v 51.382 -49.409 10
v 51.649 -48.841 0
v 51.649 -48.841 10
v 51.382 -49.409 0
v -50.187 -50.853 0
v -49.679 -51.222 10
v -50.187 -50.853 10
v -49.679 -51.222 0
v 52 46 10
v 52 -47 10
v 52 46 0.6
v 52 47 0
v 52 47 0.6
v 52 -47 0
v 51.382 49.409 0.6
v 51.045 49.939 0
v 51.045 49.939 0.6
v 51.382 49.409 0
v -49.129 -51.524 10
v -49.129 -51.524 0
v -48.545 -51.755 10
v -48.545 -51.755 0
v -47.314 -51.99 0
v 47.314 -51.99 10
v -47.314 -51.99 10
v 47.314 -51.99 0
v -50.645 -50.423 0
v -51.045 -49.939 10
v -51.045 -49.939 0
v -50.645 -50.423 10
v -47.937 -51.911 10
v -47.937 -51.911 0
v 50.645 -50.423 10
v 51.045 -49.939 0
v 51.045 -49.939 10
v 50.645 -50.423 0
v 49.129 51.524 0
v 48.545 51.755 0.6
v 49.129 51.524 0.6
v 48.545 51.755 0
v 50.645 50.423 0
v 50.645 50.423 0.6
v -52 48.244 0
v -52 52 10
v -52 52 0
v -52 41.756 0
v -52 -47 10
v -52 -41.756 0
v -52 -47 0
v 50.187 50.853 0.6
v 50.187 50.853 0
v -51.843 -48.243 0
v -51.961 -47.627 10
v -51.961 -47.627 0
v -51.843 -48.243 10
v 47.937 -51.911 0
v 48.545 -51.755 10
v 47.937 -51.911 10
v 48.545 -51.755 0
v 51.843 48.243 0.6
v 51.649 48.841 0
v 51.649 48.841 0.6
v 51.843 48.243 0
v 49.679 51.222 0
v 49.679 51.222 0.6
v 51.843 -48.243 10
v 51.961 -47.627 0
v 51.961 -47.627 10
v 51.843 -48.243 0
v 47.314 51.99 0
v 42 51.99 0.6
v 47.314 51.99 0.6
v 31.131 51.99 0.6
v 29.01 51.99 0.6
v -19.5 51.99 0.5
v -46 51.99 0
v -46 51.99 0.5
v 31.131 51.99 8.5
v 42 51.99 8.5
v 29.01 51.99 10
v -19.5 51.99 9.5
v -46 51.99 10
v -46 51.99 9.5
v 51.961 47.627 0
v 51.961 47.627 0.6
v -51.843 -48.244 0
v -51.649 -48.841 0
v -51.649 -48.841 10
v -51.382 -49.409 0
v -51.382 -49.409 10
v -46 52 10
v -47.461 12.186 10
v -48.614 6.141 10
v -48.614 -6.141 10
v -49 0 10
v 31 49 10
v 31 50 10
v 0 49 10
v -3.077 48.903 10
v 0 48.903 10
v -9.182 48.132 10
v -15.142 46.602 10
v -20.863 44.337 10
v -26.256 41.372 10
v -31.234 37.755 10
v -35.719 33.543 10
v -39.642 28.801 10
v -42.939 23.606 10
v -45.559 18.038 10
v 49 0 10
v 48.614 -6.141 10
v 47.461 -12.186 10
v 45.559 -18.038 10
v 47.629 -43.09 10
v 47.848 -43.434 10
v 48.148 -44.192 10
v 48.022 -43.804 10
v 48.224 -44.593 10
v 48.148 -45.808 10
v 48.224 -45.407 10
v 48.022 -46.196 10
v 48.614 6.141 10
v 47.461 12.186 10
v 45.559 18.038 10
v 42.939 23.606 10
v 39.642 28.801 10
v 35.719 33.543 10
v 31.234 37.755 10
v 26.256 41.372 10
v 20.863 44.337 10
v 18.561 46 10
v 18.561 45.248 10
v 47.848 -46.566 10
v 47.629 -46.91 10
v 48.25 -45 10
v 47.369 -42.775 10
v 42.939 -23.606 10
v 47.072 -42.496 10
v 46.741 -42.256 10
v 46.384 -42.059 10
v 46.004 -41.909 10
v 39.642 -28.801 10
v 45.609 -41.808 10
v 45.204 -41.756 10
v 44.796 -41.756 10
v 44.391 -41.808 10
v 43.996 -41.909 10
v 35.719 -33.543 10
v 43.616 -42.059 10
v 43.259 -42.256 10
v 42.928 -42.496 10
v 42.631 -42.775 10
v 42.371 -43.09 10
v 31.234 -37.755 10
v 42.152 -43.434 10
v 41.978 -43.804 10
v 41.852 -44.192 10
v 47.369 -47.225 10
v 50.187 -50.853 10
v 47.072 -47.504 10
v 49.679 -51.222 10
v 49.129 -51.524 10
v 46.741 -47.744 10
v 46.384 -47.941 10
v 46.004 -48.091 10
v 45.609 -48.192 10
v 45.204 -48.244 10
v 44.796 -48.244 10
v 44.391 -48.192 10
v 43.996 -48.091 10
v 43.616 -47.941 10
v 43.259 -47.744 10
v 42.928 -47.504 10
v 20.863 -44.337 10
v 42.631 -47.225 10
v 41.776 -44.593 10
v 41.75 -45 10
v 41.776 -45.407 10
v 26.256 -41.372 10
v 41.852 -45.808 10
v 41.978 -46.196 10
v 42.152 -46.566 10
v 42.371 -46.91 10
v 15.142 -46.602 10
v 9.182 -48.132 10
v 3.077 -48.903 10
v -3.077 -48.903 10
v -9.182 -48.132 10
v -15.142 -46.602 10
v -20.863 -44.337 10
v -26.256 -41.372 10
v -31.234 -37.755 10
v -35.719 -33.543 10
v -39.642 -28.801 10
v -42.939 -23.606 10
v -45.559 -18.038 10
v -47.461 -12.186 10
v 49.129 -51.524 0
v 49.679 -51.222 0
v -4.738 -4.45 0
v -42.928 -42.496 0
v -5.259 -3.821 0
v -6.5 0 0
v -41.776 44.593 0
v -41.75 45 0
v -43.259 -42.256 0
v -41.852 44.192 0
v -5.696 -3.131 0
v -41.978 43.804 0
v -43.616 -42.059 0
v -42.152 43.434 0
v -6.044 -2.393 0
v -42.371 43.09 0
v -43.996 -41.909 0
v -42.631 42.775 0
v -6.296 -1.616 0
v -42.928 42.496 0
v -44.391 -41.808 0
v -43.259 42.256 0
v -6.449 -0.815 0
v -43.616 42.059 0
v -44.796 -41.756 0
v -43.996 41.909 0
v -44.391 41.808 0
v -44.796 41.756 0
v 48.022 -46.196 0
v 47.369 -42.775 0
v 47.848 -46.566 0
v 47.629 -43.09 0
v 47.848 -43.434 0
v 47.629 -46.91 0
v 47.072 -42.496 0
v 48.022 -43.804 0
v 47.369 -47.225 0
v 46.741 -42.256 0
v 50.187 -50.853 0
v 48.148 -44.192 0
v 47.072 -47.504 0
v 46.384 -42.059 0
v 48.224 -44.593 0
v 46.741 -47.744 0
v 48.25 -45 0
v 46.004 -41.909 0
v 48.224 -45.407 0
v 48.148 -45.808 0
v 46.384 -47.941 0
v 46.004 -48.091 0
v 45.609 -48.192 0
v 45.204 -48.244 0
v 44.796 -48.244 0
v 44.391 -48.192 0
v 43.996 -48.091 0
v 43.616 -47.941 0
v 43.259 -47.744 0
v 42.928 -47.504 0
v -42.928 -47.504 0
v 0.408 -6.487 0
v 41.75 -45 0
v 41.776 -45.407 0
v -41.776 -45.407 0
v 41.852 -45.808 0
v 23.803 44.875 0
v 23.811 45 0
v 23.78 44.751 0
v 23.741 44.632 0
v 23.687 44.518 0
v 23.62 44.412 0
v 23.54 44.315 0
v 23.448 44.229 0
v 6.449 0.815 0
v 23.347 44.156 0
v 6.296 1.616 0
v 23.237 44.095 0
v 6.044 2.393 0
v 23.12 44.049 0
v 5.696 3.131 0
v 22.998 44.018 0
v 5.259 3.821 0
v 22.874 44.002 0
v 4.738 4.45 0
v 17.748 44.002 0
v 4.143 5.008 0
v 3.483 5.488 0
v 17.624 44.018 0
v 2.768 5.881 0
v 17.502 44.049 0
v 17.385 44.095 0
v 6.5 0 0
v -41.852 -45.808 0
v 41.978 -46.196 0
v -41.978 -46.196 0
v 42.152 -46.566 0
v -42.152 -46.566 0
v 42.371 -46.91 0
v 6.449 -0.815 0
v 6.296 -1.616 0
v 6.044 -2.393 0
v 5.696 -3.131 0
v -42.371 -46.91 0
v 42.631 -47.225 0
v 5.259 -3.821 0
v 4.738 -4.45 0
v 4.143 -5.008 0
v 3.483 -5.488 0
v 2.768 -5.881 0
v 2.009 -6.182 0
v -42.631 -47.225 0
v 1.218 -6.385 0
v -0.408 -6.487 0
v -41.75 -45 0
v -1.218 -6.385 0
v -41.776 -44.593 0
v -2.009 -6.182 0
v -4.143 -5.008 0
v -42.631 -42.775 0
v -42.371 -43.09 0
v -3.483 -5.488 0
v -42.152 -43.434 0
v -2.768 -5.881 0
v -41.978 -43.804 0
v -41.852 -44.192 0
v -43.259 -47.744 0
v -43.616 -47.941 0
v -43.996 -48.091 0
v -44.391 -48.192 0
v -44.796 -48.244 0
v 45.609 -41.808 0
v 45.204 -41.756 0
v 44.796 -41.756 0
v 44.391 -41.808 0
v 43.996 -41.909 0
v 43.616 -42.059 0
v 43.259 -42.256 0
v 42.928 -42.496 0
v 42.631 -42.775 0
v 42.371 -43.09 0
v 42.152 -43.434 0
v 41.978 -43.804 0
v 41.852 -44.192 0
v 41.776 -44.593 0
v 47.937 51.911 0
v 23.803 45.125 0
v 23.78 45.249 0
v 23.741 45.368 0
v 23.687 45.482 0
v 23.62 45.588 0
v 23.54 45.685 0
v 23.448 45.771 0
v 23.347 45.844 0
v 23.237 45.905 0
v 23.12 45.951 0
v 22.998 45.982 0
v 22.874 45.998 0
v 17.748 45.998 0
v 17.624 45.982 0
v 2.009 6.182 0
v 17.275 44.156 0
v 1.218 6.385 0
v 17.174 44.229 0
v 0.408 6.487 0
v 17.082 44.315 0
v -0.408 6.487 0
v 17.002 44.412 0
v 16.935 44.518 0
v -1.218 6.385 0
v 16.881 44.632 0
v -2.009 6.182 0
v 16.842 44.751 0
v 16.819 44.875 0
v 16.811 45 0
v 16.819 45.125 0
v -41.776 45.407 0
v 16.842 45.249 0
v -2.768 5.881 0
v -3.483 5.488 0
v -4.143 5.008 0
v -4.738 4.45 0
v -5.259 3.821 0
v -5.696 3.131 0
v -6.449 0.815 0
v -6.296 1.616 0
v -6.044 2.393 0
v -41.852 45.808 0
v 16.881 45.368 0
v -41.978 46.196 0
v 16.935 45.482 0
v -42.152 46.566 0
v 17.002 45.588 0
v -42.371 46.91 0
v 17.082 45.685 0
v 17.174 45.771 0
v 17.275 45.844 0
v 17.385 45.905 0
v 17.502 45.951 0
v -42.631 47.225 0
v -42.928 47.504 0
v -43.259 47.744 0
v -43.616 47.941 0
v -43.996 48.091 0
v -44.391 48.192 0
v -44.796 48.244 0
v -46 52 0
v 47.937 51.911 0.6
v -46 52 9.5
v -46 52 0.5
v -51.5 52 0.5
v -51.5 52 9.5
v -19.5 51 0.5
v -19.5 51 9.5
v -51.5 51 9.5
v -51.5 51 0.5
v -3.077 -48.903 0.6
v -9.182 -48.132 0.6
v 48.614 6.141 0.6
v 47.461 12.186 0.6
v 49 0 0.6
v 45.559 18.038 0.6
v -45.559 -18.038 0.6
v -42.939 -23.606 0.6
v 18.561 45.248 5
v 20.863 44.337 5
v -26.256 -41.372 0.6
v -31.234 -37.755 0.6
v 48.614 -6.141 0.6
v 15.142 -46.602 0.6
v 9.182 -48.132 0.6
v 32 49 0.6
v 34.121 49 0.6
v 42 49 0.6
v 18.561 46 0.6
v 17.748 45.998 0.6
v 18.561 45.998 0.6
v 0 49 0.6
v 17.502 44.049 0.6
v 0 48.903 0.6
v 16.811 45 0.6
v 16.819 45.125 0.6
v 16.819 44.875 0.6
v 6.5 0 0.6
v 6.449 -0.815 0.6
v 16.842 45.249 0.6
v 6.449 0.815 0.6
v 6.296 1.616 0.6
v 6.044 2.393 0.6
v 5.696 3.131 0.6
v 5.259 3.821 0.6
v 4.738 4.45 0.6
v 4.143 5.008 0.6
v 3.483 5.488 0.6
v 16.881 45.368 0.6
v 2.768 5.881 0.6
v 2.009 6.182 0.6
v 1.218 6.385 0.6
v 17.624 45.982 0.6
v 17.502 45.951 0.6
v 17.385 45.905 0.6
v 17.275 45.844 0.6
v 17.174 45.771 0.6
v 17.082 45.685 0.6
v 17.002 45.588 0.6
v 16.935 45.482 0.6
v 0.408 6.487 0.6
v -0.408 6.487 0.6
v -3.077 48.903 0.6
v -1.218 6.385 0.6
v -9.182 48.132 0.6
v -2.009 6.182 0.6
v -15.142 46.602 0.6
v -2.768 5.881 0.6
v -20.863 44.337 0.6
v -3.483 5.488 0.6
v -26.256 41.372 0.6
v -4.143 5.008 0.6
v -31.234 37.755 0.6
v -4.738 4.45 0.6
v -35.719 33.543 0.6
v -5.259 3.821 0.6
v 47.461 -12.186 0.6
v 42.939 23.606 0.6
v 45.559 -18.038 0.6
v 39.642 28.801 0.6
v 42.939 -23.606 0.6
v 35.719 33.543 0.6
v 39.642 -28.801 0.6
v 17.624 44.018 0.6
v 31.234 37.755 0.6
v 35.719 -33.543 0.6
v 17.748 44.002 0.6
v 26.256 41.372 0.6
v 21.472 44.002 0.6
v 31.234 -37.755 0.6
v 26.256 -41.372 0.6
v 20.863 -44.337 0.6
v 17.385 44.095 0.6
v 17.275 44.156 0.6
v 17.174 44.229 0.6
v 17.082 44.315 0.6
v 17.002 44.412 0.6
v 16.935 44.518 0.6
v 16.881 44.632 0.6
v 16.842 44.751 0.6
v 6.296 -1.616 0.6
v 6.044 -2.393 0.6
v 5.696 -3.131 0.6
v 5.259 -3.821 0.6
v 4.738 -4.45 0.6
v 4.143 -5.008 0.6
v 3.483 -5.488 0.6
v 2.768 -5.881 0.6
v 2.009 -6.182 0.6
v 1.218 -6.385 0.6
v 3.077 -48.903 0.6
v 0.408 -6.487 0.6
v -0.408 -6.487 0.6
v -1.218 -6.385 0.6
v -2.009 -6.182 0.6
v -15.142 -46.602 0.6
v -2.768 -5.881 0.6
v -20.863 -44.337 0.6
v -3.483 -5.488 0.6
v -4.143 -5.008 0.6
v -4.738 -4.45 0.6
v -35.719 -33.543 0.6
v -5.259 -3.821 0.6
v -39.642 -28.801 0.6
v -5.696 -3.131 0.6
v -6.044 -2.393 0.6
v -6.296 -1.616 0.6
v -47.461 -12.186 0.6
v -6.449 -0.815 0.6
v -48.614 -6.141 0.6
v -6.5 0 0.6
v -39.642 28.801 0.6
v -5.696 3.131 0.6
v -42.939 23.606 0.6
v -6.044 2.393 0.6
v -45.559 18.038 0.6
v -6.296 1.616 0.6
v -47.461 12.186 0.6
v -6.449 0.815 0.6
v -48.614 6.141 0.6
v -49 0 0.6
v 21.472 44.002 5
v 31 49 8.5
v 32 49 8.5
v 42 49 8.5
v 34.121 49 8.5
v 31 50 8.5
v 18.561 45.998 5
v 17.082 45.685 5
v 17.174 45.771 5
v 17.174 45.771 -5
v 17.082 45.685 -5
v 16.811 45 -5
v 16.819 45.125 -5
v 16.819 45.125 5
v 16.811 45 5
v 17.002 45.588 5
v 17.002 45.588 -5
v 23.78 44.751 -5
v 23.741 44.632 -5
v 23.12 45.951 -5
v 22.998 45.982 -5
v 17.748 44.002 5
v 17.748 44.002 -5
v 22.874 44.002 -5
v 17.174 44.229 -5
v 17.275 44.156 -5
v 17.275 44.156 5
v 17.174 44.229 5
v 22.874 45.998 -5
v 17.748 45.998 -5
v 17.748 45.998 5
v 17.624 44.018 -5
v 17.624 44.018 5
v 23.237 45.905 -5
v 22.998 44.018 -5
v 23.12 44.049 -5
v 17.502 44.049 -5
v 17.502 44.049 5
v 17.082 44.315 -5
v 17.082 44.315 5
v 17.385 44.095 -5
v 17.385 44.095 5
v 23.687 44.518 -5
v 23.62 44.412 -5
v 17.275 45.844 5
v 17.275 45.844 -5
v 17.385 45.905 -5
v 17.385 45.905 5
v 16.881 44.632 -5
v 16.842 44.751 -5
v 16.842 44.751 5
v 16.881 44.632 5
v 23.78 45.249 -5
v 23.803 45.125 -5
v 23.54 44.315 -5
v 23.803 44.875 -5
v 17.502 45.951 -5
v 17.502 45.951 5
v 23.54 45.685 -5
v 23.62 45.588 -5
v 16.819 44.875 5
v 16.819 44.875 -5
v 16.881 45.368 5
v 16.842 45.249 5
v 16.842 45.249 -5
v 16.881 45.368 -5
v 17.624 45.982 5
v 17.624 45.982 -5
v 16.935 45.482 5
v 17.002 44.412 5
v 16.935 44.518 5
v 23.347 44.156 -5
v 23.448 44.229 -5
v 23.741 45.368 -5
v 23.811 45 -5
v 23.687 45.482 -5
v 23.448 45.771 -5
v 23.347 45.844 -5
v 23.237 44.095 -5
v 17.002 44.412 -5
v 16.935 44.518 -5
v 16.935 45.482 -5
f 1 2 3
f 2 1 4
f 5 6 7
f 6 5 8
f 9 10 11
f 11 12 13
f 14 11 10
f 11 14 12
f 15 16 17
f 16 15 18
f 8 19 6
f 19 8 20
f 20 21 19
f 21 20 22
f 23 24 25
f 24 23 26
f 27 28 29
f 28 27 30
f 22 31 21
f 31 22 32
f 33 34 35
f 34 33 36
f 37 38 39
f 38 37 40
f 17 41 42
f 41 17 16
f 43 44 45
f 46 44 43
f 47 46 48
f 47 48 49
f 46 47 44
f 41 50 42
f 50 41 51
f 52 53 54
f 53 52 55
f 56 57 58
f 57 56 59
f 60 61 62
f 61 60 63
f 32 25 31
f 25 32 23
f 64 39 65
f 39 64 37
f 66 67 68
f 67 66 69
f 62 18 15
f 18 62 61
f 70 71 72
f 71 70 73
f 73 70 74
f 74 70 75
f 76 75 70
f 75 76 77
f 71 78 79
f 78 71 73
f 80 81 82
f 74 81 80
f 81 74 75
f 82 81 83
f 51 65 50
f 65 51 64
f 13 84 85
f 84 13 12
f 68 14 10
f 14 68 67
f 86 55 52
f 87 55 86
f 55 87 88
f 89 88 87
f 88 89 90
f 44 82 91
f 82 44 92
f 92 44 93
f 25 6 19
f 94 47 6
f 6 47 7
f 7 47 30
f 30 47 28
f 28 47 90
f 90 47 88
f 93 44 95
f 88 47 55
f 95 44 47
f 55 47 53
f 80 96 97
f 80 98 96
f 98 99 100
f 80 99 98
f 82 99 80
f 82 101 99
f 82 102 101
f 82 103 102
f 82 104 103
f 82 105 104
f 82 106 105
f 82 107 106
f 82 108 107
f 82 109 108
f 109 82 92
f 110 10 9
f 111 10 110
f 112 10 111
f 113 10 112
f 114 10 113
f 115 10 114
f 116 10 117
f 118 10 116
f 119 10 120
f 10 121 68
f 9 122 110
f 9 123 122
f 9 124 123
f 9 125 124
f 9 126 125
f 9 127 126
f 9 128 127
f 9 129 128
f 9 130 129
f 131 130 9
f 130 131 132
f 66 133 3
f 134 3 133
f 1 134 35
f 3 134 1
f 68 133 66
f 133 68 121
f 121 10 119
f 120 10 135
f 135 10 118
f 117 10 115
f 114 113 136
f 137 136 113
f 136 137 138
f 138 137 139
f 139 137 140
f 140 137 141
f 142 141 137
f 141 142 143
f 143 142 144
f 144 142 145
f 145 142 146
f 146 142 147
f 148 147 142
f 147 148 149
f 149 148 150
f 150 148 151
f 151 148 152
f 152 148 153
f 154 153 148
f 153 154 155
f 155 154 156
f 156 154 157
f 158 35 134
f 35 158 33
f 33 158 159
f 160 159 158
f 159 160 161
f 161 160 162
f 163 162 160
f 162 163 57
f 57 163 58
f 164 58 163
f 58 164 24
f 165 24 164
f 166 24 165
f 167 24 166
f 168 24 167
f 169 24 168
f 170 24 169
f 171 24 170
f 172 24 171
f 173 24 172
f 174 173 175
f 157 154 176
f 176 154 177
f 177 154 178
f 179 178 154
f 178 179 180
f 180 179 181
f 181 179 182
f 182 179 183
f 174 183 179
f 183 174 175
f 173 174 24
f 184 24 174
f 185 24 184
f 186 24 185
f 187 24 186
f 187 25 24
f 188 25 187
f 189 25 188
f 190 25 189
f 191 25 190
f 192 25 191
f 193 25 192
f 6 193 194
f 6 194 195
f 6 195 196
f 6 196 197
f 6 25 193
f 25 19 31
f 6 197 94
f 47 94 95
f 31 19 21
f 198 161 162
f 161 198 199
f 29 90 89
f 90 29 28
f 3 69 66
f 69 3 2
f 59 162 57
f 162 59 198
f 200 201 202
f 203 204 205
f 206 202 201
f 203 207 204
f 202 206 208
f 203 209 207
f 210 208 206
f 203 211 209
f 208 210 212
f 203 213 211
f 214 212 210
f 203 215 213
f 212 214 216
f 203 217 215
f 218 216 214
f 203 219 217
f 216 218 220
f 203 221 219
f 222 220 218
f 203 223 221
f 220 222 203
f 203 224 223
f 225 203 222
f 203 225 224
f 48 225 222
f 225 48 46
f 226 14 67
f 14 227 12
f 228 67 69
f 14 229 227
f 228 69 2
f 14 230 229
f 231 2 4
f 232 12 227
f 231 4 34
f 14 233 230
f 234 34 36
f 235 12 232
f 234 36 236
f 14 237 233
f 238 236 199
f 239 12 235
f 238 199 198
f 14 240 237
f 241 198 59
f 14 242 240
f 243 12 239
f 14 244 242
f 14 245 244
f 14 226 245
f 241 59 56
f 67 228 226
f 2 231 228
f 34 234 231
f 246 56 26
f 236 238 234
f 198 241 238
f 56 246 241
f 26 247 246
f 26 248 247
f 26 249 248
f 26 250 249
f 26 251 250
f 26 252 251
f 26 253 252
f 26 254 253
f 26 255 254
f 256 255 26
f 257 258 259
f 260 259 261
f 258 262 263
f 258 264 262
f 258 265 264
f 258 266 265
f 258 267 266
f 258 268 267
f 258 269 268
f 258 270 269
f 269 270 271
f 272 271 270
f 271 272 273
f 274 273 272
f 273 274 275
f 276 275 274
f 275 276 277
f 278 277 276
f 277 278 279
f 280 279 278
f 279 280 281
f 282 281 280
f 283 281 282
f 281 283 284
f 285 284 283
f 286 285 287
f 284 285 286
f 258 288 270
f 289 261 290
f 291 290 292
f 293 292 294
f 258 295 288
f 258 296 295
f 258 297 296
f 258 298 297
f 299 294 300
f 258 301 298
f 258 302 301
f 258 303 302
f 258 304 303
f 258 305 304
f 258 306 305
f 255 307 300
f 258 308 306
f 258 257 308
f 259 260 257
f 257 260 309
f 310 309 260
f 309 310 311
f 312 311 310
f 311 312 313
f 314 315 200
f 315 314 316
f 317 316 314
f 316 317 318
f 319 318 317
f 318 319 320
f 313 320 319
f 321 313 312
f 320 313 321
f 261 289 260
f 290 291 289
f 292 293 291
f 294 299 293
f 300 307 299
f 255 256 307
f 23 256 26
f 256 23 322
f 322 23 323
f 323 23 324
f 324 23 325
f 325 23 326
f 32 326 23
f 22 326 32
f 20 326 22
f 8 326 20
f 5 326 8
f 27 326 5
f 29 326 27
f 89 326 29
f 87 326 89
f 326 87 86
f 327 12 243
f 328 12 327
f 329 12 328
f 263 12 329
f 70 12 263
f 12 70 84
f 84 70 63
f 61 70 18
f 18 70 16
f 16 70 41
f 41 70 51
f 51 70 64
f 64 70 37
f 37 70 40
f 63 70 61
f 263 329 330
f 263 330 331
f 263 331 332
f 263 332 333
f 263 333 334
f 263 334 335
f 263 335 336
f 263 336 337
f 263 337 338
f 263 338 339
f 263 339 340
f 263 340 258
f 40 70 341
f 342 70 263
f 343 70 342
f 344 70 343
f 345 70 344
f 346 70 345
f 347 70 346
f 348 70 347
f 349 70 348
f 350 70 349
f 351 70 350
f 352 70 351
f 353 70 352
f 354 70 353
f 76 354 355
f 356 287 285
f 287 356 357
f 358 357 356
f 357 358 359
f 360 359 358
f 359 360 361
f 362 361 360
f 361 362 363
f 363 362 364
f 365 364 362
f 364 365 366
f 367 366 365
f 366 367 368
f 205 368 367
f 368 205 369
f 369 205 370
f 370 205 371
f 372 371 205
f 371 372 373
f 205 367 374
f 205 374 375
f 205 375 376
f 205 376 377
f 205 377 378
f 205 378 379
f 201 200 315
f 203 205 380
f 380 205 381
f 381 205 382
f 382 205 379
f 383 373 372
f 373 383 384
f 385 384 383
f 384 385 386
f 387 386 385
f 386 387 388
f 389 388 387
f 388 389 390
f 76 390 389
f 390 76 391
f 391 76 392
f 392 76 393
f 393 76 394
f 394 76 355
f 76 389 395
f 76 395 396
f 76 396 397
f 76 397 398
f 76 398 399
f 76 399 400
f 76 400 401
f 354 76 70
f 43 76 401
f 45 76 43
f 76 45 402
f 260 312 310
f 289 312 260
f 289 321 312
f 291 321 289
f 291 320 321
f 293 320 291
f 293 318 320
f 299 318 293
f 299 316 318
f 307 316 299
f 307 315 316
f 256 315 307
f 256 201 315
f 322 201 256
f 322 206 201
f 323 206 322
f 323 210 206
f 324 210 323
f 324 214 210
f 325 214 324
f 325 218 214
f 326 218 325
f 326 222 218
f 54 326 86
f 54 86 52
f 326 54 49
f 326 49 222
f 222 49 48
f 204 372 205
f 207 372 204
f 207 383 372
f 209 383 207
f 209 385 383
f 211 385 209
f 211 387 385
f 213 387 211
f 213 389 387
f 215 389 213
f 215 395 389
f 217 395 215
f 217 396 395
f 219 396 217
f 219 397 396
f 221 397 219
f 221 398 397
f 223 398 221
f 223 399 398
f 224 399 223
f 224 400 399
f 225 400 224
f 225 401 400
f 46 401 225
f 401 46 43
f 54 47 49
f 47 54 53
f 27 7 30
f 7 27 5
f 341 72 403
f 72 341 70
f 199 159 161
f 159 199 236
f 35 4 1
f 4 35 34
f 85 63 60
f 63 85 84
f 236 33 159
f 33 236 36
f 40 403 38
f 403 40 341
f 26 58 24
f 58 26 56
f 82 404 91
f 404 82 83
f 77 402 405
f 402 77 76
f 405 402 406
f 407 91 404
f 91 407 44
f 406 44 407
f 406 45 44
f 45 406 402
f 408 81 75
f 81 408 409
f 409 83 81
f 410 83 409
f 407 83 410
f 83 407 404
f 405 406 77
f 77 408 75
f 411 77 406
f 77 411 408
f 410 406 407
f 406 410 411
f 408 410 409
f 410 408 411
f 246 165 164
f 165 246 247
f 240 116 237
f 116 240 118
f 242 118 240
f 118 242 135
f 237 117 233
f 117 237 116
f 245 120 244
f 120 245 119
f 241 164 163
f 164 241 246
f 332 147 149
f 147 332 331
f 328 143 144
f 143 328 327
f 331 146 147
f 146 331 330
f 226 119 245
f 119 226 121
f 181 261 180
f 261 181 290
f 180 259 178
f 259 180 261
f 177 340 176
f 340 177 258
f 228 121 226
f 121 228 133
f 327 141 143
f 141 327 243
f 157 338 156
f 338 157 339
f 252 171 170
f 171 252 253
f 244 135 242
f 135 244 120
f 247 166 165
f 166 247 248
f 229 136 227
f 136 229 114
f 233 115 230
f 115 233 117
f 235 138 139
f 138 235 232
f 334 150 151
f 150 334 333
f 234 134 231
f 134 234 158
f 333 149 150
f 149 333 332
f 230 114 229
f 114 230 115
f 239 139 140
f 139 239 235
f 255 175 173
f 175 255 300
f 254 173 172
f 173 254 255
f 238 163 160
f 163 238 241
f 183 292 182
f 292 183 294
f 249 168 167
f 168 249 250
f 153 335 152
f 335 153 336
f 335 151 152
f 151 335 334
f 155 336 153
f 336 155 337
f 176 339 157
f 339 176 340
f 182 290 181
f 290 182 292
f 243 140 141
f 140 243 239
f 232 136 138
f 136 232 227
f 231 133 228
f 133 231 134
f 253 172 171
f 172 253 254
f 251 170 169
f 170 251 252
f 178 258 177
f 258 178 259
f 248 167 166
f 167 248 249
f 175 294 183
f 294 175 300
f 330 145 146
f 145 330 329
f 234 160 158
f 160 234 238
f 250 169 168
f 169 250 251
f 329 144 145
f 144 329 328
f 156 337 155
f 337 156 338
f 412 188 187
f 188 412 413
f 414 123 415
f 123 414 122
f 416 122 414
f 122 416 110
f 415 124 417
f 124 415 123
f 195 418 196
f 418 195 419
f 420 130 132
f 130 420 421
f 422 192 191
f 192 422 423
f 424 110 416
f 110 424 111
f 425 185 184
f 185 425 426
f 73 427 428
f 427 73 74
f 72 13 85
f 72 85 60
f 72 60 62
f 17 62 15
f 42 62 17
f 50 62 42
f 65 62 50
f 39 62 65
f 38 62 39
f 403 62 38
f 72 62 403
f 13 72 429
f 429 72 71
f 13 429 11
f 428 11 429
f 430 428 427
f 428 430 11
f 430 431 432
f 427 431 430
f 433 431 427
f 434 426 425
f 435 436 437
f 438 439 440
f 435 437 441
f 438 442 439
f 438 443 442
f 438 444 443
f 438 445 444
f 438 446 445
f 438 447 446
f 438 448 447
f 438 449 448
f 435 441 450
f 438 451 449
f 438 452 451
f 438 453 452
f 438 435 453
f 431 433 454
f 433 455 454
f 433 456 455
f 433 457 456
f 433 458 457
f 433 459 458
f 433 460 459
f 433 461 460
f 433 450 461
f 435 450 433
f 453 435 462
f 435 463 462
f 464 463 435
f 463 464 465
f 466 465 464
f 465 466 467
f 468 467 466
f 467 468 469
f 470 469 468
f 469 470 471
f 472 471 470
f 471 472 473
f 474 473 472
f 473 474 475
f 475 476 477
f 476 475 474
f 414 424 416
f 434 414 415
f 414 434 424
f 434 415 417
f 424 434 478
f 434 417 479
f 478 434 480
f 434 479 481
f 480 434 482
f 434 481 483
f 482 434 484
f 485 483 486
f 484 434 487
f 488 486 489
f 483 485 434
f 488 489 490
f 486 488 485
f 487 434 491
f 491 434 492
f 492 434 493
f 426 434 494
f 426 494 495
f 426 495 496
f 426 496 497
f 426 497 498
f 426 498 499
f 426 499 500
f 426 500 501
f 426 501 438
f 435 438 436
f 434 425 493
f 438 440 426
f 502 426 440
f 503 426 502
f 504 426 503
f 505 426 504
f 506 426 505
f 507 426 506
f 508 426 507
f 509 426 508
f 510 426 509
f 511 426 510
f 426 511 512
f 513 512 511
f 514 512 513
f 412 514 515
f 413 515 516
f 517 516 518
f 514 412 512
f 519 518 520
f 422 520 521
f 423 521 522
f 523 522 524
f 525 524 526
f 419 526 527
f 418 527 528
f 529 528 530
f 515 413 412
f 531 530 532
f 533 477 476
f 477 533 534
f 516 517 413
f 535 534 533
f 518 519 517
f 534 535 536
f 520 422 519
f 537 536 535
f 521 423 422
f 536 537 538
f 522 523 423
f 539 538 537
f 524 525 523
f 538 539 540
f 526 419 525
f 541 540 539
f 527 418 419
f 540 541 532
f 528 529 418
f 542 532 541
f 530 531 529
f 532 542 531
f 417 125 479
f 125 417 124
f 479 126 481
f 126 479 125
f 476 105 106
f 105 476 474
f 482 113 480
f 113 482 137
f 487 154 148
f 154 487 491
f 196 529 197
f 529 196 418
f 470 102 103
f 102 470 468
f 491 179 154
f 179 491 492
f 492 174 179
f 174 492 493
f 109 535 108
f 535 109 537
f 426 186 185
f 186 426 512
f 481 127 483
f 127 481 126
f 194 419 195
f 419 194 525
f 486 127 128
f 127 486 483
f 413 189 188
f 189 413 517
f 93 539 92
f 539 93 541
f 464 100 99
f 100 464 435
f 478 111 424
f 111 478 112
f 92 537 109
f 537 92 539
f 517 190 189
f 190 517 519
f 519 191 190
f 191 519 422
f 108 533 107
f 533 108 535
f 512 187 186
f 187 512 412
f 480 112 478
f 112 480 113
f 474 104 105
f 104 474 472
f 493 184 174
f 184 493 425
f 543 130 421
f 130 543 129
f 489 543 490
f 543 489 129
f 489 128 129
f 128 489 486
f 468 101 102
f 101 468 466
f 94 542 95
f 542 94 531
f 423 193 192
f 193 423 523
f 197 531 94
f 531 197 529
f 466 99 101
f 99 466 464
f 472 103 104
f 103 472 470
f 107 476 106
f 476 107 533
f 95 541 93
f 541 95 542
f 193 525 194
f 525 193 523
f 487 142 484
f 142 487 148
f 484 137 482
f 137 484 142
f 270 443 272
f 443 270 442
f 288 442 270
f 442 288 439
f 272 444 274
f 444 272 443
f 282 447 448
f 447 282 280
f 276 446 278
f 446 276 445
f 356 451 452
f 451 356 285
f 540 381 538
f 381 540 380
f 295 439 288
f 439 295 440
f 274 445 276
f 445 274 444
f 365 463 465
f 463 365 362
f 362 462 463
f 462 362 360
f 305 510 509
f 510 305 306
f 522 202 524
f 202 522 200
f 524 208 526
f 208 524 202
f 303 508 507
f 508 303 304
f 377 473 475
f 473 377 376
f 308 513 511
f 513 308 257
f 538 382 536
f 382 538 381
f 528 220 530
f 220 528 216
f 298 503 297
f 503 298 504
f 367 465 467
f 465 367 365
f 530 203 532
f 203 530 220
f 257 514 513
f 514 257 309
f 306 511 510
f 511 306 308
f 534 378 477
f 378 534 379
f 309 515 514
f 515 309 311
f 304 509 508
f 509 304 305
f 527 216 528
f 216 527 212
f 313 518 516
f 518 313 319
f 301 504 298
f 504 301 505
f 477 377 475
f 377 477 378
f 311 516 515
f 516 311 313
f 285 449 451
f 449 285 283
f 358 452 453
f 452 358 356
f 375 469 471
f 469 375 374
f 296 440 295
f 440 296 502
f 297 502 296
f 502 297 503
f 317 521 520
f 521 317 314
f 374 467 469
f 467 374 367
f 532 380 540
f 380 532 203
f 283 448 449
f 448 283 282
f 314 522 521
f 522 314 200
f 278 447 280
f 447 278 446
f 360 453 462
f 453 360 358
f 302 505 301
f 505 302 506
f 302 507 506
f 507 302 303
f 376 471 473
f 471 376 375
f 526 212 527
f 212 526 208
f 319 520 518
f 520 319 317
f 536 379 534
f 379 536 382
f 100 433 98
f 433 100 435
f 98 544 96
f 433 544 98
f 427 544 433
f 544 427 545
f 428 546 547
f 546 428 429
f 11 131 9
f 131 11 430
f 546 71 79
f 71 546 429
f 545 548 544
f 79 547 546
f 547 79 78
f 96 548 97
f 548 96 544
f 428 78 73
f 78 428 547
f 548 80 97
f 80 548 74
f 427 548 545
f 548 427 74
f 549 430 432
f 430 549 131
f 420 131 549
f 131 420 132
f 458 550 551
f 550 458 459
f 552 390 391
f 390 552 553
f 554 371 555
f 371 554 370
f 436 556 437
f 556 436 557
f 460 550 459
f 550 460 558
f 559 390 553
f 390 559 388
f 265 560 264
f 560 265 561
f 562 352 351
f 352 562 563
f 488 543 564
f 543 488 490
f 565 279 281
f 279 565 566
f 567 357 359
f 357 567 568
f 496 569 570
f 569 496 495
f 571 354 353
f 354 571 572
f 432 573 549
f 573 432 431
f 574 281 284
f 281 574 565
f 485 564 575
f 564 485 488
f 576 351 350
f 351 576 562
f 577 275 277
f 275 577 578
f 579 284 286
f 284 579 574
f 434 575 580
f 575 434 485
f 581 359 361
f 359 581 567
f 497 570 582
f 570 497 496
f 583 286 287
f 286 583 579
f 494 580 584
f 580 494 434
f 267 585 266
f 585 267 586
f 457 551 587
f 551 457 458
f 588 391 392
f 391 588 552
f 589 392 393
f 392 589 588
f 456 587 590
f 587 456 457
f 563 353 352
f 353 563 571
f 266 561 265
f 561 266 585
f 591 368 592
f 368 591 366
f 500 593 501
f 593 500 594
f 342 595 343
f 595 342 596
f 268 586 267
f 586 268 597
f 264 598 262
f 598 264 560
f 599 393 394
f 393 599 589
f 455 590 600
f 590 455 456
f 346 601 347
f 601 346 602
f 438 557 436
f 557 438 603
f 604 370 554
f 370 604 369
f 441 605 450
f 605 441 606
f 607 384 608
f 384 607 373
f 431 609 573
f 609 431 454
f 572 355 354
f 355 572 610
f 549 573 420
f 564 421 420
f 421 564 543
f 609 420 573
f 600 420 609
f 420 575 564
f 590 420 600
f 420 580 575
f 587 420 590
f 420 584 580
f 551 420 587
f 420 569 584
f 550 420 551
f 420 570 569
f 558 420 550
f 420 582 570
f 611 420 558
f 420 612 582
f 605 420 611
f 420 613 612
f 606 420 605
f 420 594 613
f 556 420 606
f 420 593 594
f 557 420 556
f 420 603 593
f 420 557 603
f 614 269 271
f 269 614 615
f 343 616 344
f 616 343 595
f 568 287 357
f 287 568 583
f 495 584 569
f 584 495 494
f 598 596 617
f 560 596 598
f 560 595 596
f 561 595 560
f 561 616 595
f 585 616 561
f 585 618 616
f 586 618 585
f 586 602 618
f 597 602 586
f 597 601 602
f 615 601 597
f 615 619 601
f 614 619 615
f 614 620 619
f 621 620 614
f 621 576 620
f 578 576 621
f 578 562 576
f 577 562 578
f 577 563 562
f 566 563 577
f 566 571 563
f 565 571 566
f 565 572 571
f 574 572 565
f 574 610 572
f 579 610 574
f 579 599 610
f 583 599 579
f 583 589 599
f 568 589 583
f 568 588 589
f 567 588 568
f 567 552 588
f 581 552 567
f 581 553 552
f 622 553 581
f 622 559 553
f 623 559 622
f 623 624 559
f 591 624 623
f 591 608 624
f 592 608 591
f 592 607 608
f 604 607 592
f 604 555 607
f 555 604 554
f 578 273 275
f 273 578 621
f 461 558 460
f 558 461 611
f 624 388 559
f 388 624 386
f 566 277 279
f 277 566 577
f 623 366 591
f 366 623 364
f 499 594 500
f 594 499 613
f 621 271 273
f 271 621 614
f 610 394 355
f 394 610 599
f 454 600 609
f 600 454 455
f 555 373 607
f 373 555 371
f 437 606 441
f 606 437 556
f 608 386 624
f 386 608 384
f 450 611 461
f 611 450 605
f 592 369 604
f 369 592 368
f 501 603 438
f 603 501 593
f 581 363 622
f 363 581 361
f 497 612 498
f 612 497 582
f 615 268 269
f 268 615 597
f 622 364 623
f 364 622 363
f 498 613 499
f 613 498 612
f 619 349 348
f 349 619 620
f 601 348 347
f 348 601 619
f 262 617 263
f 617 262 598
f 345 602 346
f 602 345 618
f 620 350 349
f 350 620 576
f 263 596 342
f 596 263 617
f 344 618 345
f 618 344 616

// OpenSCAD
$fn = 50;


union() {
	difference() {
		union() {
			hull() {
				translate(v = [-47.0000000000, 47.0000000000, 0]) {
					cylinder(h = 10, r = 5);
				}
				translate(v = [47.0000000000, 47.0000000000, 0]) {
					cylinder(h = 10, r = 5);
				}
				translate(v = [-47.0000000000, -47.0000000000, 0]) {
					cylinder(h = 10, r = 5);
				}
				translate(v = [47.0000000000, -47.0000000000, 0]) {
					cylinder(h = 10, r = 5);
				}
			}
			translate(v = [-52.0000000000, 46.0000000000, 0]) {
				cube(size = [6, 6, 10]);
			}
		}
		union() {
			translate(v = [-52.5000000000, -45.0000000000, -250.0000000000]) {
				rotate(a = [0, 0, 0]) {
					difference() {
						union() {
							hull() {
								translate(v = [7.5000000000, 0, 0]) {
									cylinder(h = 250, r = 3.2500000000, r1 = 3.2500000000, r2 = 3.2500000000);
								}
								translate(v = [-7.5000000000, 0, 0]) {
									cylinder(h = 250, r = 3.2500000000, r1 = 3.2500000000, r2 = 3.2500000000);
								}
							}
						}
						union();
					}
				}
			}
			translate(v = [-52.5000000000, 45.0000000000, -250.0000000000]) {
				rotate(a = [0, 0, 0]) {
					difference() {
						union() {
							hull() {
								translate(v = [7.5000000000, 0, 0]) {
									cylinder(h = 250, r = 3.2500000000, r1 = 3.2500000000, r2 = 3.2500000000);
								}
								translate(v = [-7.5000000000, 0, 0]) {
									cylinder(h = 250, r = 3.2500000000, r1 = 3.2500000000, r2 = 3.2500000000);
								}
							}
						}
						union();
					}
				}
			}
			translate(v = [-51.5000000000, 51.0000000000, 0.5000000000]) {
				cube(size = [32, 1, 9.0000000000]);
			}
			translate(v = [45.0000000000, -45.0000000000, 0]) {
				cylinder(h = 100, r = 3.2500000000);
			}
			translate(v = [0, 0, 0.6000000000]) {
				cylinder(h = 12.4000000000, r = 49.0000000000);
			}
			translate(v = [0, 0, -5.0000000000]) {
				cylinder(h = 10, r = 6.5000000000);
			}
			translate(v = [0.0000000000, 46.0000000000, 0.6000000000]) {
				cube(size = [52.0000000000, 3, 12.4000000000]);
			}
			translate(v = [42.0000000000, 46.0000000000, 0.6000000000]) {
				cube(size = [10, 6, 12.4000000000]);
			}
			translate(v = [31.0000000000, 46.0000000000, 8.5000000000]) {
				cube(size = [21, 6, 1.5000000000]);
			}
			translate(v = [28.2500000000, 52.7500000000, 0.6000000000]) {
				rotate(a = [0, 0, -45]) {
					cube(size = [7.5000000000, 1.5000000000, 12.4000000000]);
				}
			}
			translate(v = [11.0610000000, 44.0000000000, 0.6000000000]) {
				cube(size = [7.5000000000, 2, 9.4000000000]);
			}
		}
	}
	union() {
		translate(v = [20.3110000000, 45.0000000000, -5.0000000000]) {
			rotate(a = [0, 0, 0]) {
				difference() {
					union() {
						#hull() {
							#translate(v = [2.5000000000, 0, 0]) {
								cylinder(h = 10, r = 1.0000000000, r1 = 1.0000000000, r2 = 1.0000000000);
							}
							#translate(v = [-2.5000000000, 0, 0]) {
								cylinder(h = 10, r = 1.0000000000, r1 = 1.0000000000, r2 = 1.0000000000);
							}
						}
					}
					union();
				}
			}
		}
	}
}
